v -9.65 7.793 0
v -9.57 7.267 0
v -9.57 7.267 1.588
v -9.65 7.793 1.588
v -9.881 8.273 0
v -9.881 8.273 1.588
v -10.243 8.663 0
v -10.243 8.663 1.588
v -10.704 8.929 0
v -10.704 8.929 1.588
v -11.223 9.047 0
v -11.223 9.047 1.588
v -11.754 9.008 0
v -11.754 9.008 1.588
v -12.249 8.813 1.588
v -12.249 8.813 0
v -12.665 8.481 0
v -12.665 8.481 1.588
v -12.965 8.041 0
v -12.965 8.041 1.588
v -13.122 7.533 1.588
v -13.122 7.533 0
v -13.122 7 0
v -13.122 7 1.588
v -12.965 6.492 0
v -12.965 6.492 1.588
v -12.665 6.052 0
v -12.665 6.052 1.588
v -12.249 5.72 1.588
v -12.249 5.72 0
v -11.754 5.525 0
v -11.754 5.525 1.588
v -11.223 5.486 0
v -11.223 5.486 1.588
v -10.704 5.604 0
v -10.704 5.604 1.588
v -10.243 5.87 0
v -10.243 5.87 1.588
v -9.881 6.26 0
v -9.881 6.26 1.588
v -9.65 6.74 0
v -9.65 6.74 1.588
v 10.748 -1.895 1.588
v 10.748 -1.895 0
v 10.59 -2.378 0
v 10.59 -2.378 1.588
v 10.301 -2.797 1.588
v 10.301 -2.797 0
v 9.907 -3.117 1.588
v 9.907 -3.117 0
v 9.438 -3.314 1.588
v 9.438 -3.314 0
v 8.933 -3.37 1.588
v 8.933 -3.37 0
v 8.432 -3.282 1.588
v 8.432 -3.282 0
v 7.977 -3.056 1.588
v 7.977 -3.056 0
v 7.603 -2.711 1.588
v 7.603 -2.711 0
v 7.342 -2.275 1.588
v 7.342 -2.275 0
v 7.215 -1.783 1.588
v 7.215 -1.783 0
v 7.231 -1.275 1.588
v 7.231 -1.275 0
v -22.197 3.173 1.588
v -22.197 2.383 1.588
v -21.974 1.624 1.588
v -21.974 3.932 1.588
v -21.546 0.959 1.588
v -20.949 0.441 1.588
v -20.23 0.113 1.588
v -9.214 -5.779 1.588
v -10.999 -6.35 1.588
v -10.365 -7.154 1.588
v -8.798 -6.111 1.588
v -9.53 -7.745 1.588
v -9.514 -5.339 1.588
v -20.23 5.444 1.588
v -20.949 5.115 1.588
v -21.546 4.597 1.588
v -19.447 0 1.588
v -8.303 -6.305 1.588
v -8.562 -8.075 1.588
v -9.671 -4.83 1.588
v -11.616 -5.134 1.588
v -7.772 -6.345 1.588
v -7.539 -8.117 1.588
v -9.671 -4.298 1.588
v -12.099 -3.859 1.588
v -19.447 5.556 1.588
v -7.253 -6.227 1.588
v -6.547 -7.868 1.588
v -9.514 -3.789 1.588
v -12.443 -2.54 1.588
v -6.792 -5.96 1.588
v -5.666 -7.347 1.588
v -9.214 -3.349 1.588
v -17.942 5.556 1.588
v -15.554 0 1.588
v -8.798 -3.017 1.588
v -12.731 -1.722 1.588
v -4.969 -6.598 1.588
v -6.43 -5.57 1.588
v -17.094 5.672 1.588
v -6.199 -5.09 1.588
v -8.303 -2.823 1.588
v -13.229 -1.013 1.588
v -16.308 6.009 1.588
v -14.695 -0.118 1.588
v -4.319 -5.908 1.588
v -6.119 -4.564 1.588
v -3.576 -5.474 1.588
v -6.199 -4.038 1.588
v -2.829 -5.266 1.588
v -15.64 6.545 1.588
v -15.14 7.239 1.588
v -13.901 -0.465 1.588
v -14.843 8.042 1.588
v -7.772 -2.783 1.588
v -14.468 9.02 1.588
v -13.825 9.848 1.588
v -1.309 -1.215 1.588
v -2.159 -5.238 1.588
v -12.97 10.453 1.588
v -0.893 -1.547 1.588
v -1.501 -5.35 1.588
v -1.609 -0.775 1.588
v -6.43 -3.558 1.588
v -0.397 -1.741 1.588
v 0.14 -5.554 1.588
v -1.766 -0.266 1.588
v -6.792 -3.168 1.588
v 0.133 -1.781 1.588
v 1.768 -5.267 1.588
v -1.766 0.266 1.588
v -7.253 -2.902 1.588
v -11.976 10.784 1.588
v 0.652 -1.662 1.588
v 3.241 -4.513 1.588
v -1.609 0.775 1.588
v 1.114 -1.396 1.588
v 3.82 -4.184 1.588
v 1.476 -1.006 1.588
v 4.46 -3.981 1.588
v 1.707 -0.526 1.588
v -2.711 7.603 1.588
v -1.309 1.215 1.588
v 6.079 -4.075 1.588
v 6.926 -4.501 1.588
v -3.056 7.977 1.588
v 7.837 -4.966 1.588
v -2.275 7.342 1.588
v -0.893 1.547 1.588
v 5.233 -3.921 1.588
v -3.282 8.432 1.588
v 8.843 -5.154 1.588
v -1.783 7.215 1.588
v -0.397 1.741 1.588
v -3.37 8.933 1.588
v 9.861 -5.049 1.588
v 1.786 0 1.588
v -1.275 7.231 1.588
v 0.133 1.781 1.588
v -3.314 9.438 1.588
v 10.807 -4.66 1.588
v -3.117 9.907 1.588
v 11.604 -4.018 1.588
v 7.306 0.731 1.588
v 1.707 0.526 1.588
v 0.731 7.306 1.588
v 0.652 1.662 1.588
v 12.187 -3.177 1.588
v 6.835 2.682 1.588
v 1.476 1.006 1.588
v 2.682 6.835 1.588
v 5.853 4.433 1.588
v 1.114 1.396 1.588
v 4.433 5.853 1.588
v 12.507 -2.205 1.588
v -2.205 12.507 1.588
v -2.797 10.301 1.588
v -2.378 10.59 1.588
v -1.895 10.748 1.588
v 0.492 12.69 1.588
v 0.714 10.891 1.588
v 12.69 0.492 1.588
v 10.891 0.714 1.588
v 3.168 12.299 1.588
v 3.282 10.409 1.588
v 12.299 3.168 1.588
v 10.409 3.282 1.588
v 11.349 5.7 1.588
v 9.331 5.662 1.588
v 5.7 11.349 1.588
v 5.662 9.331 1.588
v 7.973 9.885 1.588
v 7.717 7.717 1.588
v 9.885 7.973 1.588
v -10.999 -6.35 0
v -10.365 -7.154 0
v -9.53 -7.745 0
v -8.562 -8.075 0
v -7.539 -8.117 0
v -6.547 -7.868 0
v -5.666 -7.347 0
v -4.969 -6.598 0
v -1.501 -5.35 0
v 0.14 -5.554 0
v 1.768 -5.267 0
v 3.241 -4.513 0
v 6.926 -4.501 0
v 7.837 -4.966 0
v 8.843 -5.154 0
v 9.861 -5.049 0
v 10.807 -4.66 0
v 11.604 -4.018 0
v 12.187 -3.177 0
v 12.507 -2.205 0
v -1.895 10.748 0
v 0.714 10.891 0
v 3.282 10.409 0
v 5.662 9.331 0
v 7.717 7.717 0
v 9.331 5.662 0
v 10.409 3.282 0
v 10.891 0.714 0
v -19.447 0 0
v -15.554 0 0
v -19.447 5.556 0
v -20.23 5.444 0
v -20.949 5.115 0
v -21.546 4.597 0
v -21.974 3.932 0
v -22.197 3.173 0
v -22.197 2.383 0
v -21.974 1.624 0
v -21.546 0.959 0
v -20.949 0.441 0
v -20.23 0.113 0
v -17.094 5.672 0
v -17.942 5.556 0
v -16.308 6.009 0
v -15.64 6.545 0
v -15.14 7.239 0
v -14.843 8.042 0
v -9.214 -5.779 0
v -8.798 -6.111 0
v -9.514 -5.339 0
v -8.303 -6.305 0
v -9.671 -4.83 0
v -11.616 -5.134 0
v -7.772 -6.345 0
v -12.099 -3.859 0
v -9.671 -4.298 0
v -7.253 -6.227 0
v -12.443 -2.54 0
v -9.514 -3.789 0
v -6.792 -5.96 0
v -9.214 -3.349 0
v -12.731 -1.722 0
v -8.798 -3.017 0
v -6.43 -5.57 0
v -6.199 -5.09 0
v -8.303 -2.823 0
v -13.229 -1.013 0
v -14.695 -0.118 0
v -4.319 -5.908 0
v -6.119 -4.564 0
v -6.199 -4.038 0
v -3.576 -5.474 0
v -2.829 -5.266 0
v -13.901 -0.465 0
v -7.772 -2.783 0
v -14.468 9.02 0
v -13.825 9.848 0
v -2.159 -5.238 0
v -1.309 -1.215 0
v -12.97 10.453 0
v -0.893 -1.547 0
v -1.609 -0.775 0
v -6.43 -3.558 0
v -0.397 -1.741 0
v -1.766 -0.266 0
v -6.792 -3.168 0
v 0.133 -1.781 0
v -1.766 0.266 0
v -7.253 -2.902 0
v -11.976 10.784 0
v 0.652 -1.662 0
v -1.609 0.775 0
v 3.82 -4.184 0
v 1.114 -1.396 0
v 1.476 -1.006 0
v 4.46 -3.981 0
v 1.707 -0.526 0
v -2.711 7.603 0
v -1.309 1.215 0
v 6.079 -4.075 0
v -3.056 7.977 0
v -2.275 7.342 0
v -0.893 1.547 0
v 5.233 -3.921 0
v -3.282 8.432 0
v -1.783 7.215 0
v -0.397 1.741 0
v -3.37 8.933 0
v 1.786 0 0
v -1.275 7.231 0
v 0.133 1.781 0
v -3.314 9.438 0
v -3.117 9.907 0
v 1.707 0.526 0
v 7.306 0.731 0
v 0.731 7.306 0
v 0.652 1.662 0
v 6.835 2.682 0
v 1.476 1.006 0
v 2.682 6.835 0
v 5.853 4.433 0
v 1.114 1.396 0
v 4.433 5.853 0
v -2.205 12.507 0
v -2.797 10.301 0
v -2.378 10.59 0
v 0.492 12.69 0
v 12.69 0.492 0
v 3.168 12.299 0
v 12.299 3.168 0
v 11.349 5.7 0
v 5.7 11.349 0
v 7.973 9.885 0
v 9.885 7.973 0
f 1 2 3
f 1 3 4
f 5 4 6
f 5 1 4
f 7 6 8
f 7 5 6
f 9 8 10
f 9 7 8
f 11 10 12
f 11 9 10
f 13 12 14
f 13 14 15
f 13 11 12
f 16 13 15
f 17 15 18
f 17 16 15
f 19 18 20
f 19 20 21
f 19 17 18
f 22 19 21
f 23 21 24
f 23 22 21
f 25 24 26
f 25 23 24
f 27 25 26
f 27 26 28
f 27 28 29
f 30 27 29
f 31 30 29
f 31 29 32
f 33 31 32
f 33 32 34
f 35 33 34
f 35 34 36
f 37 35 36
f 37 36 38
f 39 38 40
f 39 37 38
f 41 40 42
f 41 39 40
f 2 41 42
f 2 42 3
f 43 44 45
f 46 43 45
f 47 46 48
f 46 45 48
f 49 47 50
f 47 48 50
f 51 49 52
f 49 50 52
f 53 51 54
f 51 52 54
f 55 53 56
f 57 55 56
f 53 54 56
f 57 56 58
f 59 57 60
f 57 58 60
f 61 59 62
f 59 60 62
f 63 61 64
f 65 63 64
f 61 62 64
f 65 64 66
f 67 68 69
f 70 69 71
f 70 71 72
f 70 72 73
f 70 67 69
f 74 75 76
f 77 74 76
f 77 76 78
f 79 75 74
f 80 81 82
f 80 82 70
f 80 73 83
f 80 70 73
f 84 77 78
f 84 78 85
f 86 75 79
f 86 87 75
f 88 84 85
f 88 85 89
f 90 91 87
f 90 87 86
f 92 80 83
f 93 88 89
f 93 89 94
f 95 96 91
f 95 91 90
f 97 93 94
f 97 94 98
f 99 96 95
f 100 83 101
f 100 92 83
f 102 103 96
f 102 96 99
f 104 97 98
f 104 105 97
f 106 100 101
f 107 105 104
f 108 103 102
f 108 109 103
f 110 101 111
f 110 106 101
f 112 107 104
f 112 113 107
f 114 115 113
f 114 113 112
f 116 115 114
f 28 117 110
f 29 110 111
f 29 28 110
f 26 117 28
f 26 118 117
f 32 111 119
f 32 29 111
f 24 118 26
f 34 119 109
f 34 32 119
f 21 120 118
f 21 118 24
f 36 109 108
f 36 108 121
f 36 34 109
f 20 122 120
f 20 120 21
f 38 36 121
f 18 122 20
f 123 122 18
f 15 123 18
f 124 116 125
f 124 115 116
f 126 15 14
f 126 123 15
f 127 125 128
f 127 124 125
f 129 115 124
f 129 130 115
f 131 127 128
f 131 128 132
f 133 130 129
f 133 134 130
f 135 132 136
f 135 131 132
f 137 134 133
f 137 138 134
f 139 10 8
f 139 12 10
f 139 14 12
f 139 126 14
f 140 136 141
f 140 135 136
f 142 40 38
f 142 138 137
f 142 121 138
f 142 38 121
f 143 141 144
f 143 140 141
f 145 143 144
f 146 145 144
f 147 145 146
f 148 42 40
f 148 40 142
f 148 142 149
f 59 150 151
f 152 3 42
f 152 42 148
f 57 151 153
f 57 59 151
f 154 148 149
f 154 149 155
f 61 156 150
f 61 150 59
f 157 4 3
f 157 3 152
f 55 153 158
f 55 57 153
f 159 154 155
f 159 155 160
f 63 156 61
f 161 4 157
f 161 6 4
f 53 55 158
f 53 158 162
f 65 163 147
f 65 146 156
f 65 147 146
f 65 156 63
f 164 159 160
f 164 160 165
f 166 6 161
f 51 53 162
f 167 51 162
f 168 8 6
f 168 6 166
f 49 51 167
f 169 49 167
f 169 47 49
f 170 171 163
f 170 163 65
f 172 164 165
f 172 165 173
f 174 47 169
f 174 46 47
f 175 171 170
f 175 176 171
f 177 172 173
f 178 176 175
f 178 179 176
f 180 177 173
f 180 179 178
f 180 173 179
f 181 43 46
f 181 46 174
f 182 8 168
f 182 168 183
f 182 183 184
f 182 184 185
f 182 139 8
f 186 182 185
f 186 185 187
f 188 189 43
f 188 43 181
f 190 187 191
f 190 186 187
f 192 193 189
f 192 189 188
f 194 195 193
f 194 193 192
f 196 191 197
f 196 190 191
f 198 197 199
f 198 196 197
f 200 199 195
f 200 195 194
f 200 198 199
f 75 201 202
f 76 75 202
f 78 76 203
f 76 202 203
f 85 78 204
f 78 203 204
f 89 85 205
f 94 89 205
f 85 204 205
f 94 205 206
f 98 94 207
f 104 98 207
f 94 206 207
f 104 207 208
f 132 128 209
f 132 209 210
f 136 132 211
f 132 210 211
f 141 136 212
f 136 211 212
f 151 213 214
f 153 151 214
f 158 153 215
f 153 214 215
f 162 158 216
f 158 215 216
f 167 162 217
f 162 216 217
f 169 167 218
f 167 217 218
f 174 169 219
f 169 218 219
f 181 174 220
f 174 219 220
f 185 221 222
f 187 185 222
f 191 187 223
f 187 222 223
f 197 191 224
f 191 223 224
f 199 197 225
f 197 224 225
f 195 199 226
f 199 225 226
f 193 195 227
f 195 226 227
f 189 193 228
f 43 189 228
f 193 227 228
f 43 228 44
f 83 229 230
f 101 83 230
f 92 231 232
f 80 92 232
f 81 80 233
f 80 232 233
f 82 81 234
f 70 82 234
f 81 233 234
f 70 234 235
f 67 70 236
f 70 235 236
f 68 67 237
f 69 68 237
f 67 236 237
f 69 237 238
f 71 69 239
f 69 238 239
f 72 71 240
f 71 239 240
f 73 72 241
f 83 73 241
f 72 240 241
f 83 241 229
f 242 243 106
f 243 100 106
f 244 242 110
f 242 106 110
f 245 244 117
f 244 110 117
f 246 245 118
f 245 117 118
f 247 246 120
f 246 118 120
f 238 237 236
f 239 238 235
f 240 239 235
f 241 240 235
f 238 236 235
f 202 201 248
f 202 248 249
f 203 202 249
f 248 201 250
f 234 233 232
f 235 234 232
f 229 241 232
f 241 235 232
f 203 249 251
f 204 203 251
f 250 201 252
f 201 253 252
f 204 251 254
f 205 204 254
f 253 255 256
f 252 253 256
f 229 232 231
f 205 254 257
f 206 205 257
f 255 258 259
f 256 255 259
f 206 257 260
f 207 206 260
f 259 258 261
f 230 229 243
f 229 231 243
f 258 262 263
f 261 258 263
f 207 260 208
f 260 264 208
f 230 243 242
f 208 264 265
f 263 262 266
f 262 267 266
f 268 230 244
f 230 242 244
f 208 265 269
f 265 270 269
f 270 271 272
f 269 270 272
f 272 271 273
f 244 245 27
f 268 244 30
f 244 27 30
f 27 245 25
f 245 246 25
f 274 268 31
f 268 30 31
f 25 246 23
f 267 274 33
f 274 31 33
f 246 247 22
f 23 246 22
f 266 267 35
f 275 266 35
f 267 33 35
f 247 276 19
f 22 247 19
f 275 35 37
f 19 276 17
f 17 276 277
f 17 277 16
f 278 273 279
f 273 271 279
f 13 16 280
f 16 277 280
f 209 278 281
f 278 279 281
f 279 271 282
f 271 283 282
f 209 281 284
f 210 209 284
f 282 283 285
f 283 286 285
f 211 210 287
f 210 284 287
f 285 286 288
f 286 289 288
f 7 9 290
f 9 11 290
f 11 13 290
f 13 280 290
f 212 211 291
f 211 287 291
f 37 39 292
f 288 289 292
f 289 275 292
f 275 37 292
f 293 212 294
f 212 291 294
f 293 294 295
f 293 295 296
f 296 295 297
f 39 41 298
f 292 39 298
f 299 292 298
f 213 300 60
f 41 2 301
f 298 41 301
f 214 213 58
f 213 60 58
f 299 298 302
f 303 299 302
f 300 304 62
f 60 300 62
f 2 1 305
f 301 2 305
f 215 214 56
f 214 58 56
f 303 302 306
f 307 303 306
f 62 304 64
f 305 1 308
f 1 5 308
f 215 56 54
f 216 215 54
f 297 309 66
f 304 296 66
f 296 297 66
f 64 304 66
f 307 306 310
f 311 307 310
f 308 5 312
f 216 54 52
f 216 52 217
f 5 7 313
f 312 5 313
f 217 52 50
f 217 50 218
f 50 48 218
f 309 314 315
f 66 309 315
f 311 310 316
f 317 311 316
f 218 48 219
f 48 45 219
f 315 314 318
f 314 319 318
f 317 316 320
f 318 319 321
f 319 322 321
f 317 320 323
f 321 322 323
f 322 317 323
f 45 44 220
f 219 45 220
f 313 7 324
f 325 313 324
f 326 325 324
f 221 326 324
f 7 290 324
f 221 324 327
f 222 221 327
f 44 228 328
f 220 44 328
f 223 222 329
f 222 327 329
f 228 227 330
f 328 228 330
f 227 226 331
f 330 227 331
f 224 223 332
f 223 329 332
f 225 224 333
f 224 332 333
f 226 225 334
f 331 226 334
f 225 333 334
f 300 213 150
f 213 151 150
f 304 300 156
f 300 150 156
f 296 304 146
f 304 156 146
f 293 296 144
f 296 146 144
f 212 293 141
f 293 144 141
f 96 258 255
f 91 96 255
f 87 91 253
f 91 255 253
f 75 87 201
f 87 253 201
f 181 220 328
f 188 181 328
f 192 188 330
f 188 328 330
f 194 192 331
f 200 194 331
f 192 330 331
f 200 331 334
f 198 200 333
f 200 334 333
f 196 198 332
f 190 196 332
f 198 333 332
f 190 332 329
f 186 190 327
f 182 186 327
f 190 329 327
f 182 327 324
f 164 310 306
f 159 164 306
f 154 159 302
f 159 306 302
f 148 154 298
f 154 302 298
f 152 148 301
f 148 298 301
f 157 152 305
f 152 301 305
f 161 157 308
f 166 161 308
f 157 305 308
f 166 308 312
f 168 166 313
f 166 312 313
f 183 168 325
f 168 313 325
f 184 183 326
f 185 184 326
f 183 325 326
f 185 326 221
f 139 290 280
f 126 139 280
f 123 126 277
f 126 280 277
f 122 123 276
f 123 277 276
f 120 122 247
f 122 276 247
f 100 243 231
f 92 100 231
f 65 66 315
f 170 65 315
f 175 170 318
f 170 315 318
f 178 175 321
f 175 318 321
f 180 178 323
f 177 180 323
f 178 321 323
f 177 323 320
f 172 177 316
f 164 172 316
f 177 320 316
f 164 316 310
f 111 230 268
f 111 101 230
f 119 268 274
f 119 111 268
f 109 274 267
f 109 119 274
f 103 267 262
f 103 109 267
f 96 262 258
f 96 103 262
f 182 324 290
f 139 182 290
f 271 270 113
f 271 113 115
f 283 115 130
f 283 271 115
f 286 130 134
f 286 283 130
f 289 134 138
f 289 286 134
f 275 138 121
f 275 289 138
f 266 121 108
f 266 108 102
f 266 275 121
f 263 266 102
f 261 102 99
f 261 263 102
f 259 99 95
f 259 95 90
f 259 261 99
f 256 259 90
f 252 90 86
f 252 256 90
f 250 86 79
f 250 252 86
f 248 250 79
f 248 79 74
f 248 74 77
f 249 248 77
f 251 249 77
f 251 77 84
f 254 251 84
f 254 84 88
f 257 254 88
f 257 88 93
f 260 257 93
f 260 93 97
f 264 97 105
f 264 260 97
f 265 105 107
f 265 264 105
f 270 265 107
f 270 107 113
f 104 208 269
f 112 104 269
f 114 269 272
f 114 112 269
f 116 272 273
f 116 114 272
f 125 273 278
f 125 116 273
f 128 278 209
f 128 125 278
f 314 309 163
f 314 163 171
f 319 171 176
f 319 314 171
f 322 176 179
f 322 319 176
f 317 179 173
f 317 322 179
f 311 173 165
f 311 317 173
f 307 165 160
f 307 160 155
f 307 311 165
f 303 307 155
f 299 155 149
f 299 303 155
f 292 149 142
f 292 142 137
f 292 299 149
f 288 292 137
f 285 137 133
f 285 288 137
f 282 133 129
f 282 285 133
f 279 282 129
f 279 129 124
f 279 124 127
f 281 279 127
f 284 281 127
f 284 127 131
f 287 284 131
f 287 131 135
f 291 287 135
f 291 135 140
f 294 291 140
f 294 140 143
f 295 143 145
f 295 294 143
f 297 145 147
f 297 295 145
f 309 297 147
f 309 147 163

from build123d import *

# Parameters (mm, degrees)
SKETCH1_R           = 1.7859375
BOSS_EXTRUDE1_DEPTH = 1.5875
FILLET1_R           = 3.175


with BuildPart() as part:
    # Sketch1 → Boss-Extrude1 (new body)
    with BuildSketch(Plane.XY):
        with BuildLine():
            Line((-14.492018868, 5.55625), (-19.446875, 5.55625))
            ThreePointArc((-19.446875, 5.55625), (-22.225, 2.778125), (-19.446875, 0))
            Line((-19.446875, 0), (-12.7, 0))
            ThreePointArc((-12.7, 0), (-12.267257994, -3.287001873), (-10.998522628, -6.35))
            ThreePointArc((-10.998522628, -6.35), (-6.11925064, -7.65739699), (-4.811853648, -2.778125003))
            ThreePointArc((-4.811853648, -2.778125003), (0.964832728, -5.47183807), (5.471838092, -0.964832608))
            ThreePointArc((5.471838092, -0.964832608), (8.369198647, -5.102692458), (12.507058463, -2.205331856))
            ThreePointArc((12.507058463, -2.205331856), (8.980256121, 8.980256121), (-2.205331856, 12.507058463))
            Line((-2.205331856, 12.507058463), (-11.976471281, 10.78414295))
            ThreePointArc((-11.976471281, 10.78414295), (-14.574868615, 8.815275161), (-14.492018868, 5.55625))
        make_face()
        with BuildLine():
            ThreePointArc((-1.274957479, 7.230643174), (-3.343887368, 8.679323478), (-1.895207064, 10.748253367))
            ThreePointArc((-1.895207064, 10.748253367), (7.717407604, 7.717407604), (10.748253367, -1.895207064))
            ThreePointArc((10.748253367, -1.895207064), (8.679323478, -3.343887368), (7.230643174, -1.274957479))
            ThreePointArc((7.230643174, -1.274957479), (5.19171057, 5.19171057), (-1.274957479, 7.230643174))
        make_face(mode=Mode.SUBTRACT)
        with Locations((-11.356221696, 7.266532758)):
            Circle(SKETCH1_R, mode=Mode.SUBTRACT)
        Circle(SKETCH1_R, mode=Mode.SUBTRACT)
        with Locations((-7.905188139, -4.5640625)):
            Circle(SKETCH1_R, mode=Mode.SUBTRACT)
    extrude(amount=BOSS_EXTRUDE1_DEPTH)

    # Fillet1
    fillet1_edges = [part.edges().sort_by_distance(p)[0] for p in [
        (-4.811853648, -2.778125003, 0.79375),
        (-12.7, 0, 0.79375),
        (-14.492018868, 5.55625, 0.79375),
        (5.471838092, -0.964832608, 0.79375),
    ]]
    fillet(fillet1_edges, radius=FILLET1_R)


solid = part.part
